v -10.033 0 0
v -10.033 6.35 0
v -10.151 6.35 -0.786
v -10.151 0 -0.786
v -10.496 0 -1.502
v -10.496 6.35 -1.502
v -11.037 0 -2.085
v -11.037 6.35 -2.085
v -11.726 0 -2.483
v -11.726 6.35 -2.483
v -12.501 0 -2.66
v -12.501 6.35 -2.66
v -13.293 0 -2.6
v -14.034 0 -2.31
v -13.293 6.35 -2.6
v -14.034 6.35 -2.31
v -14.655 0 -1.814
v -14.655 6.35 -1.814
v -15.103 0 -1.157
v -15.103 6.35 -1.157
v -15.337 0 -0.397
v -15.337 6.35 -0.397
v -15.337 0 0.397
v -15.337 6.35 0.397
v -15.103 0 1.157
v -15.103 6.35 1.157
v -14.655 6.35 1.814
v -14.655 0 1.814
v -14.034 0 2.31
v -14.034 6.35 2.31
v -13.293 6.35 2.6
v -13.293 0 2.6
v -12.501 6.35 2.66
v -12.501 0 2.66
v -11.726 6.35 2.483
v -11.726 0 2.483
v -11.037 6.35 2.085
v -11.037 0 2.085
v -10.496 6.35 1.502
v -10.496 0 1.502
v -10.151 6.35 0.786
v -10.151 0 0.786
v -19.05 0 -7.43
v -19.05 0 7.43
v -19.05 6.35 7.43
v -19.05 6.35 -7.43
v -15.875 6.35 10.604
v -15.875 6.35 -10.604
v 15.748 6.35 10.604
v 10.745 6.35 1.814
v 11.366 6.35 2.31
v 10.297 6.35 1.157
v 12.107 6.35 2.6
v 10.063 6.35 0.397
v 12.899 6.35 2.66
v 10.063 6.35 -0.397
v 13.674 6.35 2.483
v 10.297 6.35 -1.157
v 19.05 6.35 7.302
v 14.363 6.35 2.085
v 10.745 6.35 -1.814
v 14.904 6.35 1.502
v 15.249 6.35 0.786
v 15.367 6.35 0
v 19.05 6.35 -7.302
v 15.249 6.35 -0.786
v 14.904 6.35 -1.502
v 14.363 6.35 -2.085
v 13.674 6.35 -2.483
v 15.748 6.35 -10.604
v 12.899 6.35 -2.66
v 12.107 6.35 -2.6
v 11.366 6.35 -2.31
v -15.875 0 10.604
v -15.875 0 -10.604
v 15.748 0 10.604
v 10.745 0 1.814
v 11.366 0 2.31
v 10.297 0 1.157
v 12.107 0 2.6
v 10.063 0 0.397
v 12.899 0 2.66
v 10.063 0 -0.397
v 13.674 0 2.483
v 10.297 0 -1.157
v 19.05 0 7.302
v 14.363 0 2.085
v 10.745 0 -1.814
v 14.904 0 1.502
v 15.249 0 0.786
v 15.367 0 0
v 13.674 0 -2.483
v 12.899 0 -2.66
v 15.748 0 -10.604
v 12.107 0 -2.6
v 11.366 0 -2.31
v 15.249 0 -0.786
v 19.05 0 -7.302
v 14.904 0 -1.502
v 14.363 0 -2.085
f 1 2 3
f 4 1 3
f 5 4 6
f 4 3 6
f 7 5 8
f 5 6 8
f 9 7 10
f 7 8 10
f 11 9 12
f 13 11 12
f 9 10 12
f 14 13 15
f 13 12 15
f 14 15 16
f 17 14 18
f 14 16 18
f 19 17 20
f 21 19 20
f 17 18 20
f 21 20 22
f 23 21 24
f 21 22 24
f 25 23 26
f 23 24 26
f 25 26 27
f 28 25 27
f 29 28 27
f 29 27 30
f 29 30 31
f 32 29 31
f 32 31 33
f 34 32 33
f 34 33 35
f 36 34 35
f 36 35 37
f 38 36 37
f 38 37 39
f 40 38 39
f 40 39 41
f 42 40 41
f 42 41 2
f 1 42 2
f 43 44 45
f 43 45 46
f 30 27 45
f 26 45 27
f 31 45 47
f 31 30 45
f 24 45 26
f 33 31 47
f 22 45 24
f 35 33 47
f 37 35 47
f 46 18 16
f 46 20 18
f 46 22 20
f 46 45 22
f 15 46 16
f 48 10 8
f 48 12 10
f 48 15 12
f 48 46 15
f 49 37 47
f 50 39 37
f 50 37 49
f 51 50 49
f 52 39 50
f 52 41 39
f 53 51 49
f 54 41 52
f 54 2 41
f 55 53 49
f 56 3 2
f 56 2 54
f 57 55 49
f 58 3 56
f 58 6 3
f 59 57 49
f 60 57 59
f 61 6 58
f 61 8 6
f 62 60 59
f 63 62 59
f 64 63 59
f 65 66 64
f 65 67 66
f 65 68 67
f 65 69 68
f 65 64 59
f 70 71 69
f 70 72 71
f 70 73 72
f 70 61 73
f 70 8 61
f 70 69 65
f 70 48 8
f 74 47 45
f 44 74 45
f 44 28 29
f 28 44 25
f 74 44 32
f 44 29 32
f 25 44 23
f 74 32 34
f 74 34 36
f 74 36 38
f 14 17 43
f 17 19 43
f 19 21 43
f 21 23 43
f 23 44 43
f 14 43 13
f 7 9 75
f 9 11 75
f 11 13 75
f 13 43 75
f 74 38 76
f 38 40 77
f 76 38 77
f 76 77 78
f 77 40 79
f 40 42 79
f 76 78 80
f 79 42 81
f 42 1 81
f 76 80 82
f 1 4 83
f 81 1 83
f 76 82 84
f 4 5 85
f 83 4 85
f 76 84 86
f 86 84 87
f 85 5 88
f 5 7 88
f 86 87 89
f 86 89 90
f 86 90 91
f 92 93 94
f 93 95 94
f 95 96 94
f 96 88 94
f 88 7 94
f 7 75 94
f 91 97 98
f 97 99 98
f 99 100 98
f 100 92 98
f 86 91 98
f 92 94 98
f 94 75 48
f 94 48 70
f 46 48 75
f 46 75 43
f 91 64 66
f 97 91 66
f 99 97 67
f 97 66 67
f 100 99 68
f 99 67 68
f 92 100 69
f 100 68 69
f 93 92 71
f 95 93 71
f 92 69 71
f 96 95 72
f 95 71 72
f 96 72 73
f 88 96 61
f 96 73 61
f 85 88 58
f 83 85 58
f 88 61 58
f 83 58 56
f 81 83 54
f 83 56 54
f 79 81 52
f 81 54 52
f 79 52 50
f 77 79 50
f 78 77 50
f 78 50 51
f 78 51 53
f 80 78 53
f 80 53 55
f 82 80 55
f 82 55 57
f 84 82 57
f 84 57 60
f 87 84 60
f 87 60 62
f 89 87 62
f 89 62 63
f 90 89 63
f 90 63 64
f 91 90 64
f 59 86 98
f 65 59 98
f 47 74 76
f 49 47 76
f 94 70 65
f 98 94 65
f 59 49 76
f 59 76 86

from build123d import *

# Parameters (mm, degrees)
SKETCH1_W           = 38.1
SKETCH1_H           = 21.209
BOSS_EXTRUDE1_DEPTH = 6.35
SKETCH2_R           = 2.667
CUT_EXTRUDE1_DEPTH  = 9.525
CUT_EXTRUDE2_DEPTH  = 9.525


with BuildPart() as part:
    # Sketch1 → Boss-Extrude1 (new body)
    with BuildSketch(Plane(origin=(0, 0, 0), x_dir=(1, 0, 0), z_dir=(0, 1, 0))):
        Rectangle(SKETCH1_W, SKETCH1_H)
    extrude(amount=BOSS_EXTRUDE1_DEPTH)

    # Sketch2 → Cut-Extrude1 (cut)
    with BuildSketch(Plane(origin=(0, 6.35, 0), x_dir=(1, 0, 0), z_dir=(0, 1, 0))):
        with Locations((-12.7, 0)):
            Circle(SKETCH2_R)
        with Locations((12.7, 0)):
            Circle(SKETCH2_R)
    extrude(amount=-CUT_EXTRUDE1_DEPTH, mode=Mode.SUBTRACT)

    # Sketch3 → Cut-Extrude2 (cut)
    with BuildSketch(Plane(origin=(0, 6.35, 0), x_dir=(1, 0, 0), z_dir=(0, 1, 0))):
        Polygon((-19.05, 10.6045), (-15.875, 10.6045), (-19.05, 7.4295), align=None)
        Polygon((19.05, 10.6045), (15.748, 10.6045), (19.05, 7.3025), align=None)
        Polygon((19.05, -10.6045), (15.748, -10.6045), (19.05, -7.3025), align=None)
        Polygon((-19.05, -10.6045), (-15.875, -10.6045), (-19.05, -7.4295), align=None)
    extrude(amount=-CUT_EXTRUDE2_DEPTH, mode=Mode.SUBTRACT)


solid = part.part
